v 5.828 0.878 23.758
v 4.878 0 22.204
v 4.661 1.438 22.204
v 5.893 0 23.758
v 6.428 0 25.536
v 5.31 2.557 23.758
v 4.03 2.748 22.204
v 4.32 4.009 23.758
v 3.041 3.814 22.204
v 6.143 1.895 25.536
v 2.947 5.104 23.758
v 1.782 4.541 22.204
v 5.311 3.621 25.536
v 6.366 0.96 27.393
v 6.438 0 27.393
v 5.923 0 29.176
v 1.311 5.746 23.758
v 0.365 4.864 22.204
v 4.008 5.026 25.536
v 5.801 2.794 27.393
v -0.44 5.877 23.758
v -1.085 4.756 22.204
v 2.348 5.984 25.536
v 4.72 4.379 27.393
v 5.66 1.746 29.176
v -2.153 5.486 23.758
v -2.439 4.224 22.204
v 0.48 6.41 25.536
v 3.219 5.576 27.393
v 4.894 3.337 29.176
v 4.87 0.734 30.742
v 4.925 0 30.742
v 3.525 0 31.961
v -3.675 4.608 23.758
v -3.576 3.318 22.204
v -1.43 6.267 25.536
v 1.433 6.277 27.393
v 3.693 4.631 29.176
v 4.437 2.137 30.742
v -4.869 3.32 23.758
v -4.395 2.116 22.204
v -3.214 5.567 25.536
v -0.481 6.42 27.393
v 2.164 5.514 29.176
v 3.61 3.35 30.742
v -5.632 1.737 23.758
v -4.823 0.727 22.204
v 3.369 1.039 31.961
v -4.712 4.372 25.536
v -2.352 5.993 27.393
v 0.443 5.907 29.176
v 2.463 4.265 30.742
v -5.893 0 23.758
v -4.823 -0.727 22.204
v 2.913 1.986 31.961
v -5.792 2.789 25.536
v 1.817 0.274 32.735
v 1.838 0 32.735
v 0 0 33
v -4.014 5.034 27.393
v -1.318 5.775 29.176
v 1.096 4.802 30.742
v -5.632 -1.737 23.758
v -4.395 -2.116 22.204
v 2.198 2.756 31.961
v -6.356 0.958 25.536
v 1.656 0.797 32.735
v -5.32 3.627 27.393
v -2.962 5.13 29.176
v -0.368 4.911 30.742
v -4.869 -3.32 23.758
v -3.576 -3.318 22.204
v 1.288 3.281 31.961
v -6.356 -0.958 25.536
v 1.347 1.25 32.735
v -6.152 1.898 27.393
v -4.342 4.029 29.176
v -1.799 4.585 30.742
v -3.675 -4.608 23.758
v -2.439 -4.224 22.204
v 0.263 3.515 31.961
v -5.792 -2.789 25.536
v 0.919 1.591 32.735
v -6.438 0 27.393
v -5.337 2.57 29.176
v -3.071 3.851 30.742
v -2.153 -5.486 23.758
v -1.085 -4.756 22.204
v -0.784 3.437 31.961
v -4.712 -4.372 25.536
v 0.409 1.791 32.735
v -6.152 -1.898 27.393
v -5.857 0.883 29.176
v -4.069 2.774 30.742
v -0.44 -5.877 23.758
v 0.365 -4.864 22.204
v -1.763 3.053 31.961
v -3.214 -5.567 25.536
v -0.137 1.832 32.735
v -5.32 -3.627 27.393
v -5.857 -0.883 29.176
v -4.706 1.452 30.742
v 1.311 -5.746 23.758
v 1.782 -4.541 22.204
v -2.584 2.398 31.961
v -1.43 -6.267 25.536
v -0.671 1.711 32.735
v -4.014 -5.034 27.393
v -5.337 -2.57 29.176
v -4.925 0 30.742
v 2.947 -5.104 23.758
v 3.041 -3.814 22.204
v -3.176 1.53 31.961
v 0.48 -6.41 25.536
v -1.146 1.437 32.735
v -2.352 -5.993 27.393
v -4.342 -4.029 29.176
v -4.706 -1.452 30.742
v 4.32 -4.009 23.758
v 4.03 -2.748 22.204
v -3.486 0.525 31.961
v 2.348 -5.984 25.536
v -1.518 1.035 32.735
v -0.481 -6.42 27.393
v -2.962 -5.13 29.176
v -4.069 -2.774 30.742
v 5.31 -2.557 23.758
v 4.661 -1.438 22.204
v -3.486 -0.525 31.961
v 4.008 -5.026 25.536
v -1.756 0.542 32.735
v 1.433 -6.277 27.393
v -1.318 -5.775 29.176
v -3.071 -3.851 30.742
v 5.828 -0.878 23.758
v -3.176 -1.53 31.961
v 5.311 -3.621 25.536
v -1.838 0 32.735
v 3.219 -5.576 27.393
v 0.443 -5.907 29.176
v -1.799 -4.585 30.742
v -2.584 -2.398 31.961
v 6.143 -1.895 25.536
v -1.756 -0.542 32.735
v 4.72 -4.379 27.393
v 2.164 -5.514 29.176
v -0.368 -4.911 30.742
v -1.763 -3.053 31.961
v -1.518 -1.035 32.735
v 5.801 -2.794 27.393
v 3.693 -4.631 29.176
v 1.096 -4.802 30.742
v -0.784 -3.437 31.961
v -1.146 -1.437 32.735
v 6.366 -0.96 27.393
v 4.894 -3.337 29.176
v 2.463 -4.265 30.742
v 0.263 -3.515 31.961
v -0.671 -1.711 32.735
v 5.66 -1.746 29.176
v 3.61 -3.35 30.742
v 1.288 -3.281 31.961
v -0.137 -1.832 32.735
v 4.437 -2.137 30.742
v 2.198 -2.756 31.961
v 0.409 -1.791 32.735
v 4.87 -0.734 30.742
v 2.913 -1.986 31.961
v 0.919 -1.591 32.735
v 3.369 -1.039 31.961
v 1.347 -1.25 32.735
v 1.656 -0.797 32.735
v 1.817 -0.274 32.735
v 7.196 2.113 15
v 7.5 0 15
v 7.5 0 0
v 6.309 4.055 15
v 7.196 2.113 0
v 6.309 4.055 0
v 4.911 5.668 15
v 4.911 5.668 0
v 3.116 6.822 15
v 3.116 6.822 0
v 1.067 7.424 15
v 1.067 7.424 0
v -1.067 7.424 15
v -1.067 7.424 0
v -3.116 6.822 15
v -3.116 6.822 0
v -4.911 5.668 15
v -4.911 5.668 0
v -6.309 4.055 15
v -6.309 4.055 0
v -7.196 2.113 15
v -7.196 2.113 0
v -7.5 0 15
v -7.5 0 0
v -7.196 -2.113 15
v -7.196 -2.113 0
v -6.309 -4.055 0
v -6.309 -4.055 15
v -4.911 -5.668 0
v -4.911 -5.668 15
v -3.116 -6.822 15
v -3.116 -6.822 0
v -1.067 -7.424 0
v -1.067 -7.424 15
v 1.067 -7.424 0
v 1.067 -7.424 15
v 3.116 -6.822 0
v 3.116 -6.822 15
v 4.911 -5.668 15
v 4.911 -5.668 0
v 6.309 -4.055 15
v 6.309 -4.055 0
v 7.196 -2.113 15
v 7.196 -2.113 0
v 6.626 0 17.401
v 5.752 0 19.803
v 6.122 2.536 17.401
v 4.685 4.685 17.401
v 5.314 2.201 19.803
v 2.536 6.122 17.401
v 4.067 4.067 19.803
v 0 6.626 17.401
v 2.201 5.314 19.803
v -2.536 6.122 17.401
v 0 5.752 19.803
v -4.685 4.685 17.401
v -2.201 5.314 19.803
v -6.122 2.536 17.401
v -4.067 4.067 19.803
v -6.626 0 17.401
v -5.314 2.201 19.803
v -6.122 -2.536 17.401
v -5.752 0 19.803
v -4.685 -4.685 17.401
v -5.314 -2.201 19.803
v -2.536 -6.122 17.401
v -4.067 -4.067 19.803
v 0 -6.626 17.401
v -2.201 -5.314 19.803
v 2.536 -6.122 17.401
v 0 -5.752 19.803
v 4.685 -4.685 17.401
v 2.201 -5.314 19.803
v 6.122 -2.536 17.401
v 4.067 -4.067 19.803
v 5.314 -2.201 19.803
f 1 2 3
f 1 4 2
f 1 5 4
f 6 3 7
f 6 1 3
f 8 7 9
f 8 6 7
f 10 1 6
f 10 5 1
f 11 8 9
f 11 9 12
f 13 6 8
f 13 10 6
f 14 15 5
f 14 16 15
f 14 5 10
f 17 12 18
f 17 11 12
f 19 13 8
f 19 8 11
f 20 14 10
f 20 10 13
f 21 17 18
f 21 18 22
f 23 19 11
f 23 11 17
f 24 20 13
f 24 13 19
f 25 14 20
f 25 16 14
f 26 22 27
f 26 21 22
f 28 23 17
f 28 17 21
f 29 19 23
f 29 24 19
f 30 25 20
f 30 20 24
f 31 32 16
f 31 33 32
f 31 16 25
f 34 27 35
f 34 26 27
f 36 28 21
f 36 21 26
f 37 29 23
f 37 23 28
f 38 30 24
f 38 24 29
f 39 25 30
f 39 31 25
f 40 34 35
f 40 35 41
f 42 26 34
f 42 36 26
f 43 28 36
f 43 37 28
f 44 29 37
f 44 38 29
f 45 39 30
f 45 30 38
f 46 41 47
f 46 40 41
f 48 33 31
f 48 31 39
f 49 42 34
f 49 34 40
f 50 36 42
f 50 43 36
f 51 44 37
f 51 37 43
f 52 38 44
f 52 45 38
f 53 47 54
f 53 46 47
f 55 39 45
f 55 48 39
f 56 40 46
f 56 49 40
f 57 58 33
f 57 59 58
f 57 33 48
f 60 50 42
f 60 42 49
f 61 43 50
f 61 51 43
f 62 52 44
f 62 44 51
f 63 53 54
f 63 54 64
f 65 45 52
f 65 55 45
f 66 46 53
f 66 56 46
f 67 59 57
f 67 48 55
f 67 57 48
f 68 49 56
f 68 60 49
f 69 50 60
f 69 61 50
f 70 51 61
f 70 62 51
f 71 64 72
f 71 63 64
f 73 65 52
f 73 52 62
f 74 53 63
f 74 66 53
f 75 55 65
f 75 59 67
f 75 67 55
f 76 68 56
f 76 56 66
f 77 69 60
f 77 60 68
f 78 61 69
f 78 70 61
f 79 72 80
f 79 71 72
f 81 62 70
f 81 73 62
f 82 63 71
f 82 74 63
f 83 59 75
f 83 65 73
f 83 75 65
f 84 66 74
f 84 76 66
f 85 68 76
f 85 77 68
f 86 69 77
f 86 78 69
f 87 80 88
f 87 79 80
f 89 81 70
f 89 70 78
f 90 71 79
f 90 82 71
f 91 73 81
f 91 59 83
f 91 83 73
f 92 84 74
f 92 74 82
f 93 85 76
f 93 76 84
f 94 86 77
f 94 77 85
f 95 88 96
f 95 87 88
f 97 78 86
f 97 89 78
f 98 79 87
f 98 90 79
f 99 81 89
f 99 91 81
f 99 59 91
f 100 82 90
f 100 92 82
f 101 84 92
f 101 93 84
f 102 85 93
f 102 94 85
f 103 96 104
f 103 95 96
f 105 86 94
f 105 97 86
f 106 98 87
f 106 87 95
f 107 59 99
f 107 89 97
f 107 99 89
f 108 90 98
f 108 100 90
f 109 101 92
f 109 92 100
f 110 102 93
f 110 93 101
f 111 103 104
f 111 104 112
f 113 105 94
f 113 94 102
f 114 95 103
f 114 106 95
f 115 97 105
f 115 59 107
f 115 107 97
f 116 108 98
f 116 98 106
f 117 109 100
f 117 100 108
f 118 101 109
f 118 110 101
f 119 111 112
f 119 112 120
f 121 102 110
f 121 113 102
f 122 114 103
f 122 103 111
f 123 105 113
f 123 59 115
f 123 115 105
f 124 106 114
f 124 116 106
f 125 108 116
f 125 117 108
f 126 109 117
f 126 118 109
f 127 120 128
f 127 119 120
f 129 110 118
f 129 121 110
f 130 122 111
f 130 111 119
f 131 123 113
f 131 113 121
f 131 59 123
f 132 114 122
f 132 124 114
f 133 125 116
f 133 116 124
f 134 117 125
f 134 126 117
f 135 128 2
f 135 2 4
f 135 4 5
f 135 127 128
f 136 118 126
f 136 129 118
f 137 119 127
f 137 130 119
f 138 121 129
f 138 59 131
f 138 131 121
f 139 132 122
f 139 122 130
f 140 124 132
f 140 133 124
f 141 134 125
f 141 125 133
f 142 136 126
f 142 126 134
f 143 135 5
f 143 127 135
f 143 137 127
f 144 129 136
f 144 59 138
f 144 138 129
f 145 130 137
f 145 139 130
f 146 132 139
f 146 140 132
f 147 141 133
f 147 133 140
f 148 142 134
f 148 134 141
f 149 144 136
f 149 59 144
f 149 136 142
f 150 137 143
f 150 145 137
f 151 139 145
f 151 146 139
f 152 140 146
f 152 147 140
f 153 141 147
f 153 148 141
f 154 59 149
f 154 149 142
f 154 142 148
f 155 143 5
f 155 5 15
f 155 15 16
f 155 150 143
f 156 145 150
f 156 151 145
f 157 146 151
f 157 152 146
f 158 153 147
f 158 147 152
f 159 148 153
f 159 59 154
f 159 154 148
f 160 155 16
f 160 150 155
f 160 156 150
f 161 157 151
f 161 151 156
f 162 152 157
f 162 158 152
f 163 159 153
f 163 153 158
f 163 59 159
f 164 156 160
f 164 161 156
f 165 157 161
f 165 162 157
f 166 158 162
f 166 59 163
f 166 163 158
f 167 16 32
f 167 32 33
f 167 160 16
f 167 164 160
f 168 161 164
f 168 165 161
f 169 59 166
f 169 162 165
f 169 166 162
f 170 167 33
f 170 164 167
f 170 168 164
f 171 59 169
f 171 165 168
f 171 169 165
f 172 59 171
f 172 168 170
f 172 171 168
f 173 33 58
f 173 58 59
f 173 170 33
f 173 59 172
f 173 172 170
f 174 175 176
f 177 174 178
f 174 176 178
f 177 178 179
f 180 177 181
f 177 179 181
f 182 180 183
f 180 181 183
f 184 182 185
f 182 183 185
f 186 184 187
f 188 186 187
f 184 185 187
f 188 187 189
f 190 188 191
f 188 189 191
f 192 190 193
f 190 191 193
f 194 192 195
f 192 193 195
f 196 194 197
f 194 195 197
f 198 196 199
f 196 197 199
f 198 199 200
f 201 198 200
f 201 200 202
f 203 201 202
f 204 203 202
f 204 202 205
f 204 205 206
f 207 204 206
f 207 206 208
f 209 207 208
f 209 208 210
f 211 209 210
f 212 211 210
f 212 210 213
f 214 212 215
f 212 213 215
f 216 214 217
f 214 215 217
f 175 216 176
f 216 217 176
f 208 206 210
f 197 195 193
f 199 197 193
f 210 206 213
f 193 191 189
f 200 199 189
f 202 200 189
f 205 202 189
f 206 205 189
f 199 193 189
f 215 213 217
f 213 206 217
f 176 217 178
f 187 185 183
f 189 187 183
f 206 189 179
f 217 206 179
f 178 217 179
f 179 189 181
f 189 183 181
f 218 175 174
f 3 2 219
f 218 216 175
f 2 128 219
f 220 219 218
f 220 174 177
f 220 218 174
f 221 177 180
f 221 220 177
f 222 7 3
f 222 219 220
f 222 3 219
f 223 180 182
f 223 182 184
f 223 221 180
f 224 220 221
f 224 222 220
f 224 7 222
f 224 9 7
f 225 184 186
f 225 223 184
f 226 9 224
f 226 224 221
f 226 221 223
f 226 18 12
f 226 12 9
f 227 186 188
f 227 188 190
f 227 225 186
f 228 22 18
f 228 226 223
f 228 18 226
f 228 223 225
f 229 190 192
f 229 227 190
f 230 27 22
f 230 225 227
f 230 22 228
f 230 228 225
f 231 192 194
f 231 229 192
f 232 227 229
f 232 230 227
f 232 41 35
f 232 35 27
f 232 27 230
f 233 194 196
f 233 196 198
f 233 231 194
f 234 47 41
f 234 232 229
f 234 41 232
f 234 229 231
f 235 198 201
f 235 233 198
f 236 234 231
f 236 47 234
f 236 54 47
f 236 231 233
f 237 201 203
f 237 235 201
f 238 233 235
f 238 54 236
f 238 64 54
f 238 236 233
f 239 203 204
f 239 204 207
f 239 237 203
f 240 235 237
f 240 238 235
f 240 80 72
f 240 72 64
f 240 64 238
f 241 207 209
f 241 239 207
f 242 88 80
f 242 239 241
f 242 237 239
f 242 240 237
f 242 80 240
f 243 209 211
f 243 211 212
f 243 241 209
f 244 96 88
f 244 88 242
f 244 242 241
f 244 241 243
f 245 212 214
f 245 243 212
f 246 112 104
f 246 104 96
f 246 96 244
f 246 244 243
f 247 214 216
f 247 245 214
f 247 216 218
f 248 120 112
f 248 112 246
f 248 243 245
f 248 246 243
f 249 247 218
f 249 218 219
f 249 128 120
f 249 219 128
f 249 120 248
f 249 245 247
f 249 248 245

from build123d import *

# Parameters (mm, degrees)
F0_R      = 7.5
F1_DEPTH  = 15
F1_FACE_R = 7.5
F2_DEPTH  = 10
F2_TAPER  = 20


with BuildPart() as f1:
    # F0 (on Top) → F1 (new body)
    with BuildSketch(Plane.XY):
        Circle(F0_R)
    extrude(amount=F1_DEPTH)

    # F1_face (on face) → F2 (join)
    with BuildSketch(Plane.XY.offset(15)):
        Circle(F1_FACE_R)
    extrude(amount=F2_DEPTH, taper=F2_TAPER)

    # F3 (on Front) → F4 (revolve)
    with BuildSketch(Plane.XZ):
        with BuildLine():
            Line((0, 33), (0, 20))
            ThreePointArc((0, 20), (6.5, 26.5), (0, 33))
        make_face()
    revolve(axis=Axis((0, 0, 26.5), (0, 0, 1)))


solid = f1.part
